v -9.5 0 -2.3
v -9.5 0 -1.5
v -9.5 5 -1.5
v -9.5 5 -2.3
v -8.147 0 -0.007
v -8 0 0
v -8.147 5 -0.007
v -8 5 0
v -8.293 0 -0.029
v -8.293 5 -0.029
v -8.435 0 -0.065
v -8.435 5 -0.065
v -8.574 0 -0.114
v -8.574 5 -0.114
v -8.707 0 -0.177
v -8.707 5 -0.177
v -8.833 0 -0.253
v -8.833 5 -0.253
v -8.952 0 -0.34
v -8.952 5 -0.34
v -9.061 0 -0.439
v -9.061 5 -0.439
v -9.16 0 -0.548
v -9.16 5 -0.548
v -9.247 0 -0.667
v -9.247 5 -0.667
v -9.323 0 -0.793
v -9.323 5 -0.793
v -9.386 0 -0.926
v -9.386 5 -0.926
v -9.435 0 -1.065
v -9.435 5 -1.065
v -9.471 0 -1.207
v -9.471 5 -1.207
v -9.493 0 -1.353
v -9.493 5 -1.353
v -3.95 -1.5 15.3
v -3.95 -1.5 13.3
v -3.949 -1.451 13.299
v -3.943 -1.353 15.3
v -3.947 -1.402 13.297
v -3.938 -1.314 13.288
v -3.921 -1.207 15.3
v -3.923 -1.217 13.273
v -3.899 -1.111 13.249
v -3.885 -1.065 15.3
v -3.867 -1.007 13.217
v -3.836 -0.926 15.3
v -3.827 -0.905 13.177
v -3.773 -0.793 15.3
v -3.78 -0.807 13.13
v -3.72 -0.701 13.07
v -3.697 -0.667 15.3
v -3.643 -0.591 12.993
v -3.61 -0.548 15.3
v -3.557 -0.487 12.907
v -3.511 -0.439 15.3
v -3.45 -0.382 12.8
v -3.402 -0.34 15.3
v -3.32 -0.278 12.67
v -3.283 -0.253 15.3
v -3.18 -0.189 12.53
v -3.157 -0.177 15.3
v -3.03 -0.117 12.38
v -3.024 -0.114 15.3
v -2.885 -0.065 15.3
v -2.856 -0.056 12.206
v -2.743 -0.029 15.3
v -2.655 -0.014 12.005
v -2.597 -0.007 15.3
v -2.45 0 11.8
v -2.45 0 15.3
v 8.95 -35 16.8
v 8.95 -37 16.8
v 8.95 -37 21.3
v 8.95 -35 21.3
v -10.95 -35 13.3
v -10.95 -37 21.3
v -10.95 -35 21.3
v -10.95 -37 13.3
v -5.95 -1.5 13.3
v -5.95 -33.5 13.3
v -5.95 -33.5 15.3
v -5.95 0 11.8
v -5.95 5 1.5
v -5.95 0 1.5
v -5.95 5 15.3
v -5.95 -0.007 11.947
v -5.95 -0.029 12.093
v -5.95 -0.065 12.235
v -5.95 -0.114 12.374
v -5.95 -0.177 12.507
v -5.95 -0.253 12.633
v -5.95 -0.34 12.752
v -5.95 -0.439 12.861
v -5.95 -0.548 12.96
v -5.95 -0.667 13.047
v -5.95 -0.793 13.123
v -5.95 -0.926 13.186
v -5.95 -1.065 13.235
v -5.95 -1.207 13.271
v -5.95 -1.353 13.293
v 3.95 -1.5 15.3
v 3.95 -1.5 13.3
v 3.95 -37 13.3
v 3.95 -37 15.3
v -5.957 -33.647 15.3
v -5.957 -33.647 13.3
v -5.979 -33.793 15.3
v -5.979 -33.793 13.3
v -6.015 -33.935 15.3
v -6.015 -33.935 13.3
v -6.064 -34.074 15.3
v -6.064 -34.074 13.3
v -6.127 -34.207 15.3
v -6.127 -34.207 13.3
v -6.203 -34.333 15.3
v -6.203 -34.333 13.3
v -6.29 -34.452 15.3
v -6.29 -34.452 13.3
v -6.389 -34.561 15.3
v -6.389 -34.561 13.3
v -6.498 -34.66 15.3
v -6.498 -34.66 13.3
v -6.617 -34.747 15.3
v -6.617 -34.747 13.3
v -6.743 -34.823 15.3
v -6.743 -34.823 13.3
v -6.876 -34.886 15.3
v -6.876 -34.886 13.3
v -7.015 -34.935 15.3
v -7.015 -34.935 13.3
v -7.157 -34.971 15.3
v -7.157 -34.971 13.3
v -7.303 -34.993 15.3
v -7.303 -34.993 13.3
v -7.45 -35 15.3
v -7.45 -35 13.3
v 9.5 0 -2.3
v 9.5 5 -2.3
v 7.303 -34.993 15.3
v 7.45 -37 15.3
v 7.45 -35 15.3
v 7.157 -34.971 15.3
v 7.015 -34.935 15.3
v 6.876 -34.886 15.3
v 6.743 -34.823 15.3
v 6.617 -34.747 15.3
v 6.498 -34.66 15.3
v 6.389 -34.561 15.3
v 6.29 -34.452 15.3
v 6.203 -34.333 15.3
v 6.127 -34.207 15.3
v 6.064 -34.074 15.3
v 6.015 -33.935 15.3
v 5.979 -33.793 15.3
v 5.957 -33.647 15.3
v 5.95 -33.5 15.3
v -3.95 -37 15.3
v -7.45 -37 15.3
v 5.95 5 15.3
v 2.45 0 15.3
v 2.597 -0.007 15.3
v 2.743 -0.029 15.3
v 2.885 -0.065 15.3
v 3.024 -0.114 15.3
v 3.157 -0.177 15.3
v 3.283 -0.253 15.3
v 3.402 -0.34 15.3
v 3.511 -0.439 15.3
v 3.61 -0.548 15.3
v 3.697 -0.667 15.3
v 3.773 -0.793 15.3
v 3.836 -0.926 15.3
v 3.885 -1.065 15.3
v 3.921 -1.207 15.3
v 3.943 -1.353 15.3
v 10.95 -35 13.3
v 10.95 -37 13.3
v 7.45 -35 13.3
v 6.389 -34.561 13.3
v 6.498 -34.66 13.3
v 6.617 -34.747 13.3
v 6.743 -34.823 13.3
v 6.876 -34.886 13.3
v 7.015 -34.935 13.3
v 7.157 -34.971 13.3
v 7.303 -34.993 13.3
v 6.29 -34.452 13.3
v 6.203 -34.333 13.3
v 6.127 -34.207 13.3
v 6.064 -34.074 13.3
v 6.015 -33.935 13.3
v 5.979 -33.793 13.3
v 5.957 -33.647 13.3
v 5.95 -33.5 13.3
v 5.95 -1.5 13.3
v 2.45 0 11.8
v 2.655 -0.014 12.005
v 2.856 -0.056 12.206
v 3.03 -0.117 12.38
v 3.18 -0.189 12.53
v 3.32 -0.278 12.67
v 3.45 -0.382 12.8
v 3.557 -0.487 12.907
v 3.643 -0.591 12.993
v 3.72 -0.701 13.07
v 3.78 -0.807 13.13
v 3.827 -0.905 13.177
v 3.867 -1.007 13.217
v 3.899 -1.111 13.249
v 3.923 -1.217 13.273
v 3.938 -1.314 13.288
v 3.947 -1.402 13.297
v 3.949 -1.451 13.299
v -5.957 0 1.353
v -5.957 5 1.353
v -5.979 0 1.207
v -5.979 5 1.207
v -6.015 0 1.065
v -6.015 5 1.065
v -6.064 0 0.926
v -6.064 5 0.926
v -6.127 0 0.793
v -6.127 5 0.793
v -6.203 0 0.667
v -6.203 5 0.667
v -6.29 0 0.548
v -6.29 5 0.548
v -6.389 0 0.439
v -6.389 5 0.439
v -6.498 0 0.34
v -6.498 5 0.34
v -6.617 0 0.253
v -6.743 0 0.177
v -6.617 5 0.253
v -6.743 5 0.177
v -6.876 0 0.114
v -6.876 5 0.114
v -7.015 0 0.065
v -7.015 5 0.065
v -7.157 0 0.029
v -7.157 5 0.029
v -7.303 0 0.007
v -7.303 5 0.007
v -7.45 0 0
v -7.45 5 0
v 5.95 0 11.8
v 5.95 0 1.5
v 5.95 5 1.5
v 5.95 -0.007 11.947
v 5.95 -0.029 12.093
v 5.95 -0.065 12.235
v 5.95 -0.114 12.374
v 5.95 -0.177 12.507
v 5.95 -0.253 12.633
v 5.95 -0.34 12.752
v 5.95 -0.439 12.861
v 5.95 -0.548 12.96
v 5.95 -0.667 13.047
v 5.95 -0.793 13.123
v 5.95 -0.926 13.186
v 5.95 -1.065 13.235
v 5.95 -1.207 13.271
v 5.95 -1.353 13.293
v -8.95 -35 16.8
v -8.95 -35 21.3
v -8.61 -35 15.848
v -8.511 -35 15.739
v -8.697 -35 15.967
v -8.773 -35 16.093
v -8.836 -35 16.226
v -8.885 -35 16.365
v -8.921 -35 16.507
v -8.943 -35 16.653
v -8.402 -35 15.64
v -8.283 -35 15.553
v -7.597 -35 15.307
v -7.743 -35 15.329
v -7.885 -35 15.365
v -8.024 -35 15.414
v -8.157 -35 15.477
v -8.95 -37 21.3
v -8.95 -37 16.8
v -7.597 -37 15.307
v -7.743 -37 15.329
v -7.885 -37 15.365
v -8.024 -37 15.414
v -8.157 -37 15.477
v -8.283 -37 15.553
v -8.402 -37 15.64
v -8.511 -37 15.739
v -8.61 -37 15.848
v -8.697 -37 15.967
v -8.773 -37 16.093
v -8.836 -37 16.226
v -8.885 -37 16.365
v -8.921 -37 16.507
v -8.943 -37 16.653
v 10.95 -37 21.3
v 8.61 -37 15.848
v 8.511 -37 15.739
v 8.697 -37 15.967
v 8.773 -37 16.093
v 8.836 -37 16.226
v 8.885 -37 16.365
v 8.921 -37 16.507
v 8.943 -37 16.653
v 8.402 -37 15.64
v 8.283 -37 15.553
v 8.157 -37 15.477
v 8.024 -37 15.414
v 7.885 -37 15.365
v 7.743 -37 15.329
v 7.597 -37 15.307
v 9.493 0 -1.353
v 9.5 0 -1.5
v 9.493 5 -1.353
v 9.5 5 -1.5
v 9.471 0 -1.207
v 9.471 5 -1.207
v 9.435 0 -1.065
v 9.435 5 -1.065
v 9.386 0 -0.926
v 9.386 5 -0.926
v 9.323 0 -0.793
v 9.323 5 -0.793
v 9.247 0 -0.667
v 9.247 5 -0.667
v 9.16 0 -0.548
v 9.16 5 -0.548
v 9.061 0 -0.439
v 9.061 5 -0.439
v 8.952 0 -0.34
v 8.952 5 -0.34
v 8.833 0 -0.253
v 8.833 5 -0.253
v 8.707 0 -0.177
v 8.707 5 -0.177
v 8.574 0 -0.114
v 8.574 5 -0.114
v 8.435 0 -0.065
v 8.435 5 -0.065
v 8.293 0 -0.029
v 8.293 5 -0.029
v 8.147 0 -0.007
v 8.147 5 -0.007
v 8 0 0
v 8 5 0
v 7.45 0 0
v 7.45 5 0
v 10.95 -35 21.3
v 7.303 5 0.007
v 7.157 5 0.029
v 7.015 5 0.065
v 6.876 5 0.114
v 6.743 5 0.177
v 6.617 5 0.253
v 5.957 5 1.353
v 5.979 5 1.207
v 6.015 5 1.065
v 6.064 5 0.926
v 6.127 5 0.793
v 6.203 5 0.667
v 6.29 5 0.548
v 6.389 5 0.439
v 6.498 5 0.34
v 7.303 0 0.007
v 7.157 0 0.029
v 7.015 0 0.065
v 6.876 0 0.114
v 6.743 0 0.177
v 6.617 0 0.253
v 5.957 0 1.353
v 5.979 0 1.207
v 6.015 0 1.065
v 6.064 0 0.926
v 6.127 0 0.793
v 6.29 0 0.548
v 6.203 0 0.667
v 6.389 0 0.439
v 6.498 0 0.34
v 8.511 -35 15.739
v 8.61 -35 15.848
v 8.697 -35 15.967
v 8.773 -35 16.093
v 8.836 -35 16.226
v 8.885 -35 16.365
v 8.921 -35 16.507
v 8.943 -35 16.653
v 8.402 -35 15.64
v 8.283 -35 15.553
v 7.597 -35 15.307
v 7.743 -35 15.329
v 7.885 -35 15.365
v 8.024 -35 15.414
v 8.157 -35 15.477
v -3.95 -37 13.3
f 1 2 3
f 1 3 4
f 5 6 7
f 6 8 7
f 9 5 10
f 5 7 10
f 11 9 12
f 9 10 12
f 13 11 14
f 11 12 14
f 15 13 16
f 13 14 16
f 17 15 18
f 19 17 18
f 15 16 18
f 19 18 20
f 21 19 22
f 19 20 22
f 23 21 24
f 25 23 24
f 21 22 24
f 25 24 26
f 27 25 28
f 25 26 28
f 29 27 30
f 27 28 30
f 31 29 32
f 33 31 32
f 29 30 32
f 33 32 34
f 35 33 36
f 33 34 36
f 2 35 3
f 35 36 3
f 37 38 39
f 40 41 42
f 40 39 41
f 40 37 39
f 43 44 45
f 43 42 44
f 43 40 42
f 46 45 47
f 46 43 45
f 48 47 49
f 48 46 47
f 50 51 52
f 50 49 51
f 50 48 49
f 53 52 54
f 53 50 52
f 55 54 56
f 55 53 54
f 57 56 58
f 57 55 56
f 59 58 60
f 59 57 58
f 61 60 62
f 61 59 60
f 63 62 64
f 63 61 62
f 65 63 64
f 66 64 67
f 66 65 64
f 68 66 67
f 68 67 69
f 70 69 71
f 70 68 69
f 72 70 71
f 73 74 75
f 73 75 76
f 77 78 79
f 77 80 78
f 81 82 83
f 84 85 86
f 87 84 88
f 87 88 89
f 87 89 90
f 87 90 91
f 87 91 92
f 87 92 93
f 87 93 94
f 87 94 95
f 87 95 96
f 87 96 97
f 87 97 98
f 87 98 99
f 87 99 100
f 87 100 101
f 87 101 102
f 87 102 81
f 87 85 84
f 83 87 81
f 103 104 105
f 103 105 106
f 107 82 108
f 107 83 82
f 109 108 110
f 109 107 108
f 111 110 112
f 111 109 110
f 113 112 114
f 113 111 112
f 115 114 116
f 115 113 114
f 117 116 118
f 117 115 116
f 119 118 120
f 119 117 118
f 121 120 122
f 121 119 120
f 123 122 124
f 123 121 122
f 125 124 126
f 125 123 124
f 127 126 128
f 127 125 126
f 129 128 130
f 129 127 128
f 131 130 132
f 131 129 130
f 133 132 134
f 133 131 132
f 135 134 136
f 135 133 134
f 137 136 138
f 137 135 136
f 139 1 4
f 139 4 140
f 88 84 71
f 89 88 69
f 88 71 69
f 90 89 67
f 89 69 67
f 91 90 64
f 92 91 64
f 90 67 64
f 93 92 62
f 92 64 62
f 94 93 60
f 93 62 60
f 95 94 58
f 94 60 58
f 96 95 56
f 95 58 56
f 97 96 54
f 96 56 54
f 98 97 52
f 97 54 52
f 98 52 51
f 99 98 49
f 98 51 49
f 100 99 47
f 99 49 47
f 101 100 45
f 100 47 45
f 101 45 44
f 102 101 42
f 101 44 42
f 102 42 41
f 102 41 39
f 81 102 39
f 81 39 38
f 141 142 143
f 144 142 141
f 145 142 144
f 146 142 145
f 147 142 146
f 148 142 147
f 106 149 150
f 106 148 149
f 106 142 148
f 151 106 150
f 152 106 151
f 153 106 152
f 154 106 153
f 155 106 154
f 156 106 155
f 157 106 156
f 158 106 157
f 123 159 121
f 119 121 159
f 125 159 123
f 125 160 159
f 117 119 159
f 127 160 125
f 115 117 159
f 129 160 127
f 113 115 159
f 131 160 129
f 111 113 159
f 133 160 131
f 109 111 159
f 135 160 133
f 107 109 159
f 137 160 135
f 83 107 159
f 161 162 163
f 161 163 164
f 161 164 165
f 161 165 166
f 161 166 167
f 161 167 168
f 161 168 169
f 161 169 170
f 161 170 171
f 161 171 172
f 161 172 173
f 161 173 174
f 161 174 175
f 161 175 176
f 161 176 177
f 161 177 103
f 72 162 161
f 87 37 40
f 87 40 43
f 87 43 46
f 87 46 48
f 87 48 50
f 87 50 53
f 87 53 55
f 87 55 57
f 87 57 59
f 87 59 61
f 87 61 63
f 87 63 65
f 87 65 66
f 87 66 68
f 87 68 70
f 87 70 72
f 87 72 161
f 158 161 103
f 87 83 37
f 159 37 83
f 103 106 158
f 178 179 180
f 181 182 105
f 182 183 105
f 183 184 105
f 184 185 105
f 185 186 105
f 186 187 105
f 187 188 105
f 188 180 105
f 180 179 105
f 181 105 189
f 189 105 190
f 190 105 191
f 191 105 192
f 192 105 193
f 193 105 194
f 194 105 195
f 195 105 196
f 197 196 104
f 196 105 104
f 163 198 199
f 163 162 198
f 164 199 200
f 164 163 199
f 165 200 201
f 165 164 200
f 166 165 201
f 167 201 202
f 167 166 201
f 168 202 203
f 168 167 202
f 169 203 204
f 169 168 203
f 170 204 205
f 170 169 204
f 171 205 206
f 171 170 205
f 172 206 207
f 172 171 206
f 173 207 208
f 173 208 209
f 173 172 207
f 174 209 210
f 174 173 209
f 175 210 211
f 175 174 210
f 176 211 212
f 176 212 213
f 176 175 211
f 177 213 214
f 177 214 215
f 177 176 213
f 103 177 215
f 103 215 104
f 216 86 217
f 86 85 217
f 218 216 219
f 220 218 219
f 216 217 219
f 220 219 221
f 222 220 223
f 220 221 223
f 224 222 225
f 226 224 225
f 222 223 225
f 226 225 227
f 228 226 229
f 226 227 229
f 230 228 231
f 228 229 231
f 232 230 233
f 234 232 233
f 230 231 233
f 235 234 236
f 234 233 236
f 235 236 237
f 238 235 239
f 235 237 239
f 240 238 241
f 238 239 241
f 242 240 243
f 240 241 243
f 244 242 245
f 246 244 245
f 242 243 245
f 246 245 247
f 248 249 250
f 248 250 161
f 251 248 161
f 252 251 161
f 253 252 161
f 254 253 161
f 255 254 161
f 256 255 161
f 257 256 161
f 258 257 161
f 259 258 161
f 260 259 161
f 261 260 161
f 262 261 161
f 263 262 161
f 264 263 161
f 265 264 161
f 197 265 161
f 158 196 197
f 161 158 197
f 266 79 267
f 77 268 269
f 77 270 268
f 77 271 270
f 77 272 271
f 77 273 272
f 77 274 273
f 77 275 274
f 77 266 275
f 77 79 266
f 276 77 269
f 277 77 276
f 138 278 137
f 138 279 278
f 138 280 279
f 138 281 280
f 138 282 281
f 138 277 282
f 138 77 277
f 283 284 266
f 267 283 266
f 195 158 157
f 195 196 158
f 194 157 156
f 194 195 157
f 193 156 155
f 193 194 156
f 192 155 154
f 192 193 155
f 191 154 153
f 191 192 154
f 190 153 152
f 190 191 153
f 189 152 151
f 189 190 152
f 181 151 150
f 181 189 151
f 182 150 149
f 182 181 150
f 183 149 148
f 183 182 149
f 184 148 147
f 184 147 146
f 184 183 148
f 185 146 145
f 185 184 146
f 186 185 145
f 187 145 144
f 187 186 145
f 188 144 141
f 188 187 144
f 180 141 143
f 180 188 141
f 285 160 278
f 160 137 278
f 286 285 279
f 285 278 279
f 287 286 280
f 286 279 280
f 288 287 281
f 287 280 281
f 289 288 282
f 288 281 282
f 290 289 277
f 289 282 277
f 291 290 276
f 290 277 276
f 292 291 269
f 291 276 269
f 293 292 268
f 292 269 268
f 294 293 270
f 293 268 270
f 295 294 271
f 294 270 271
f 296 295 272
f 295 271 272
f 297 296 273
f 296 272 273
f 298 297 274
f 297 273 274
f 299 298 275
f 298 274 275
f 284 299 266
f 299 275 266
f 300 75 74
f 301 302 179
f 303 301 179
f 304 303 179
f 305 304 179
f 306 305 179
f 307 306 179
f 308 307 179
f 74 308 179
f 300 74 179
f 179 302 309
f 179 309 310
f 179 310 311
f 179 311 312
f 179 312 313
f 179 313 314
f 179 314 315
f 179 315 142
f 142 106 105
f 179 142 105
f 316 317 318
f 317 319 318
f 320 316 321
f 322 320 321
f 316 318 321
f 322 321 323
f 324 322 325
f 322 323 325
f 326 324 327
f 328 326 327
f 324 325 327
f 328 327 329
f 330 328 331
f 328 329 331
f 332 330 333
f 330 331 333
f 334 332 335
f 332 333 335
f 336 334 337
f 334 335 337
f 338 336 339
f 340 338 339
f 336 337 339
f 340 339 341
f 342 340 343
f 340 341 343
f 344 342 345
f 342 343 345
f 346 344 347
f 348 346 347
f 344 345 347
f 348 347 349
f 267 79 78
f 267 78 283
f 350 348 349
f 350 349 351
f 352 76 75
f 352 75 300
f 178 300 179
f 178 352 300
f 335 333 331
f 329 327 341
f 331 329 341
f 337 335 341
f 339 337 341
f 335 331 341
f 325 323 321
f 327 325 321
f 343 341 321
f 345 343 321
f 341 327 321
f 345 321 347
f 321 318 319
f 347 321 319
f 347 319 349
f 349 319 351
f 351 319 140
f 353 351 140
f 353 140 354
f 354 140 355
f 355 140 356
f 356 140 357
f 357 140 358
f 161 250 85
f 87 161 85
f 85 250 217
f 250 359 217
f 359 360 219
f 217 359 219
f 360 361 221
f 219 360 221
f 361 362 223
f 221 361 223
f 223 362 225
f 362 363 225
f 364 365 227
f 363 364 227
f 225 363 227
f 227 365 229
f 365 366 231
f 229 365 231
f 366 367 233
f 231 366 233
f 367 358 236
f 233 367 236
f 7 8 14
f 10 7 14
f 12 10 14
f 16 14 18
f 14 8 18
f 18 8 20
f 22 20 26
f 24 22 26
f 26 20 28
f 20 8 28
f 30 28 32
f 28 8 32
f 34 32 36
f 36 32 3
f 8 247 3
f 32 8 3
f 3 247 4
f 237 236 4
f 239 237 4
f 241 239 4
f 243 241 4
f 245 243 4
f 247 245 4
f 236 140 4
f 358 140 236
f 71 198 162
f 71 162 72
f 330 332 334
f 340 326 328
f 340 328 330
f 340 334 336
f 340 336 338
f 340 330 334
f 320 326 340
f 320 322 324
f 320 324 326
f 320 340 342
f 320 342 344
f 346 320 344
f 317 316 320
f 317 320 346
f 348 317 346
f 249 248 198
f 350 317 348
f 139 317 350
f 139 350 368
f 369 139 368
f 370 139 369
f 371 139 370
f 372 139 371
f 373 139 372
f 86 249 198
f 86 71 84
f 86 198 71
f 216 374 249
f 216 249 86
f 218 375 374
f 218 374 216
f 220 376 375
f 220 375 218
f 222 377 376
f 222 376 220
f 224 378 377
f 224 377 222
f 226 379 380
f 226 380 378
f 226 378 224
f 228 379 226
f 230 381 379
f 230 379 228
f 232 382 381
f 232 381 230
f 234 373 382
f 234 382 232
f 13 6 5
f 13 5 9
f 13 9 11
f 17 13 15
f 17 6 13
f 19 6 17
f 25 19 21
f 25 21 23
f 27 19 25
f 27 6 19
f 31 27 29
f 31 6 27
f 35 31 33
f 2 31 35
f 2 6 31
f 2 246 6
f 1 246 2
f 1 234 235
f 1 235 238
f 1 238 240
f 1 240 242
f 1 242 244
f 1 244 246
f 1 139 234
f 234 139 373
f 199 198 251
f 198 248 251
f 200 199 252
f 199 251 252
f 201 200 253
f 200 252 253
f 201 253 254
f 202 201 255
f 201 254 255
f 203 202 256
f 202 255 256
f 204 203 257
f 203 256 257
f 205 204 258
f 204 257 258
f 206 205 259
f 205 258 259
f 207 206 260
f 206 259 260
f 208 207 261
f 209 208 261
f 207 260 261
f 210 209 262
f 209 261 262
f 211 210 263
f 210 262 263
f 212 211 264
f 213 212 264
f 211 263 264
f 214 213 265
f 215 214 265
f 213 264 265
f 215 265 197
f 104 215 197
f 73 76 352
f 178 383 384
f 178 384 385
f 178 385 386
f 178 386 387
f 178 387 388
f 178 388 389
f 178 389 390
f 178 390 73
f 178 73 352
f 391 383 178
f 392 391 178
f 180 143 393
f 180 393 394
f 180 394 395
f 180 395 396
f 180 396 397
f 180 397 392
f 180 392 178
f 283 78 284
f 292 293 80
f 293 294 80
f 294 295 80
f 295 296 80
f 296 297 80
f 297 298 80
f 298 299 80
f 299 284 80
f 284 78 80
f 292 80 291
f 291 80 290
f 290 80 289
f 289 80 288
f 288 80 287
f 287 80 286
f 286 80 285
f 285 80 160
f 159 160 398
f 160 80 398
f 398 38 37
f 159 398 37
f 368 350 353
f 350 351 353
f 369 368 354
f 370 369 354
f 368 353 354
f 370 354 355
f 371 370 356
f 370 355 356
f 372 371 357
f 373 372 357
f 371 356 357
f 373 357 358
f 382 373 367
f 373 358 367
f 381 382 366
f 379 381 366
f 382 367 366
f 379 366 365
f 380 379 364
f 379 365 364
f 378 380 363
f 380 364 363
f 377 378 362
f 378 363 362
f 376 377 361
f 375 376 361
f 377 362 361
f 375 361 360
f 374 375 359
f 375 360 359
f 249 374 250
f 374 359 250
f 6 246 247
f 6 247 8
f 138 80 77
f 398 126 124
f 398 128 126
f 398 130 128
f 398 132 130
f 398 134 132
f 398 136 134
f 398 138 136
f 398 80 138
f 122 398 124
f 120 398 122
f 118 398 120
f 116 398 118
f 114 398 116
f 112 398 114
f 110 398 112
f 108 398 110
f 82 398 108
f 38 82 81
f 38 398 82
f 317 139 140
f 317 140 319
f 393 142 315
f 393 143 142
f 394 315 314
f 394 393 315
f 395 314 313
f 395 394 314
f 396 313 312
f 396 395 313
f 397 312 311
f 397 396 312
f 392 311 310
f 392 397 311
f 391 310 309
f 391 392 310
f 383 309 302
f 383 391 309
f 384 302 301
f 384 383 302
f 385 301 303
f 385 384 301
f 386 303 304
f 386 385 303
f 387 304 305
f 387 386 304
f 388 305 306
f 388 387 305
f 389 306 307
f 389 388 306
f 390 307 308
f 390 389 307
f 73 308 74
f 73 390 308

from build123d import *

# Parameters (mm, degrees)
BOSS_EXTRUDE1_DEPTH = 5
SKETCH2_W           = 2
SKETCH2_H           = 2
BOSS_EXTRUDE2_DEPTH = 37
SKETCH3_W           = 2
SKETCH3_H           = 2
BOSS_EXTRUDE3_DEPTH = 5
SKETCH4_W           = 2
SKETCH4_H           = 2
BOSS_EXTRUDE4_DEPTH = 5
SKETCH5_W           = 2
SKETCH5_H           = 2
BOSS_EXTRUDE5_DEPTH = 6
FILLET2_R           = 1.5
FILLET3_R           = 1.5


with BuildPart() as part:
    # Sketch1 → Boss-Extrude1 (new body)
    with BuildSketch(Plane(origin=(0, 0, 0), x_dir=(1, 0, 0), z_dir=(0, 1, 0))):
        Polygon((-9.5, 2.3), (9.5, 2.3), (9.5, 0), (5.95, 0), (5.95, -15.3), (-5.95, -15.3), (-5.95, 0), (-9.5, 0), align=None)
    extrude(amount=BOSS_EXTRUDE1_DEPTH)

    # Sketch2 → Boss-Extrude2 (add)
    with BuildSketch(Plane.XZ):
        with Locations((-4.95, 14.3)):
            Rectangle(SKETCH2_W, SKETCH2_H)
        with Locations((4.95, 14.3)):
            Rectangle(SKETCH2_W, SKETCH2_H)
    extrude(amount=BOSS_EXTRUDE2_DEPTH)

    # Sketch3 → Boss-Extrude3 (add)
    with BuildSketch(Plane.ZY.offset(5.95)):
        with Locations((14.3, -36)):
            Rectangle(SKETCH3_W, SKETCH3_H)
    extrude(amount=BOSS_EXTRUDE3_DEPTH)

    # Sketch4 → Boss-Extrude4 (add)
    with BuildSketch(Plane(origin=(5.95, 0, 0), x_dir=(0, 0, -1), z_dir=(1, 0, 0))):
        with Locations((-14.3, -36)):
            Rectangle(SKETCH4_W, SKETCH4_H)
    extrude(amount=BOSS_EXTRUDE4_DEPTH)

    # Sketch5 → Boss-Extrude5 (add)
    with BuildSketch(Plane.XY.offset(15.3)):
        with Locations((-9.95, -36)):
            Rectangle(SKETCH5_W, SKETCH5_H)
        with Locations((9.95, -36)):
            Rectangle(SKETCH5_W, SKETCH5_H)
    extrude(amount=BOSS_EXTRUDE5_DEPTH)

    # Fillet2
    fillet2_edges = [part.edges().sort_by_distance(p)[0] for p in [
        (9.5, 2.5, 0),
        (5.95, 2.5, 0),
        (-5.95, 2.5, 0),
        (-9.5, 2.5, 0),
        (-4.95, 0, 13.3),
        (-3.95, 0, 14.3),
        (3.95, 0, 14.3),
        (4.95, 0, 13.3),
        (-5.95, -35, 14.3),
        (5.95, -35, 14.3),
    ]]
    fillet(fillet2_edges, radius=FILLET2_R)

    # Fillet3
    fillet3_edges = [part.edges().sort_by_distance(p)[0] for p in [
        (-8.95, -36, 15.3),
        (8.95, -36, 15.3),
    ]]
    fillet(fillet3_edges, radius=FILLET3_R)


solid = part.part
